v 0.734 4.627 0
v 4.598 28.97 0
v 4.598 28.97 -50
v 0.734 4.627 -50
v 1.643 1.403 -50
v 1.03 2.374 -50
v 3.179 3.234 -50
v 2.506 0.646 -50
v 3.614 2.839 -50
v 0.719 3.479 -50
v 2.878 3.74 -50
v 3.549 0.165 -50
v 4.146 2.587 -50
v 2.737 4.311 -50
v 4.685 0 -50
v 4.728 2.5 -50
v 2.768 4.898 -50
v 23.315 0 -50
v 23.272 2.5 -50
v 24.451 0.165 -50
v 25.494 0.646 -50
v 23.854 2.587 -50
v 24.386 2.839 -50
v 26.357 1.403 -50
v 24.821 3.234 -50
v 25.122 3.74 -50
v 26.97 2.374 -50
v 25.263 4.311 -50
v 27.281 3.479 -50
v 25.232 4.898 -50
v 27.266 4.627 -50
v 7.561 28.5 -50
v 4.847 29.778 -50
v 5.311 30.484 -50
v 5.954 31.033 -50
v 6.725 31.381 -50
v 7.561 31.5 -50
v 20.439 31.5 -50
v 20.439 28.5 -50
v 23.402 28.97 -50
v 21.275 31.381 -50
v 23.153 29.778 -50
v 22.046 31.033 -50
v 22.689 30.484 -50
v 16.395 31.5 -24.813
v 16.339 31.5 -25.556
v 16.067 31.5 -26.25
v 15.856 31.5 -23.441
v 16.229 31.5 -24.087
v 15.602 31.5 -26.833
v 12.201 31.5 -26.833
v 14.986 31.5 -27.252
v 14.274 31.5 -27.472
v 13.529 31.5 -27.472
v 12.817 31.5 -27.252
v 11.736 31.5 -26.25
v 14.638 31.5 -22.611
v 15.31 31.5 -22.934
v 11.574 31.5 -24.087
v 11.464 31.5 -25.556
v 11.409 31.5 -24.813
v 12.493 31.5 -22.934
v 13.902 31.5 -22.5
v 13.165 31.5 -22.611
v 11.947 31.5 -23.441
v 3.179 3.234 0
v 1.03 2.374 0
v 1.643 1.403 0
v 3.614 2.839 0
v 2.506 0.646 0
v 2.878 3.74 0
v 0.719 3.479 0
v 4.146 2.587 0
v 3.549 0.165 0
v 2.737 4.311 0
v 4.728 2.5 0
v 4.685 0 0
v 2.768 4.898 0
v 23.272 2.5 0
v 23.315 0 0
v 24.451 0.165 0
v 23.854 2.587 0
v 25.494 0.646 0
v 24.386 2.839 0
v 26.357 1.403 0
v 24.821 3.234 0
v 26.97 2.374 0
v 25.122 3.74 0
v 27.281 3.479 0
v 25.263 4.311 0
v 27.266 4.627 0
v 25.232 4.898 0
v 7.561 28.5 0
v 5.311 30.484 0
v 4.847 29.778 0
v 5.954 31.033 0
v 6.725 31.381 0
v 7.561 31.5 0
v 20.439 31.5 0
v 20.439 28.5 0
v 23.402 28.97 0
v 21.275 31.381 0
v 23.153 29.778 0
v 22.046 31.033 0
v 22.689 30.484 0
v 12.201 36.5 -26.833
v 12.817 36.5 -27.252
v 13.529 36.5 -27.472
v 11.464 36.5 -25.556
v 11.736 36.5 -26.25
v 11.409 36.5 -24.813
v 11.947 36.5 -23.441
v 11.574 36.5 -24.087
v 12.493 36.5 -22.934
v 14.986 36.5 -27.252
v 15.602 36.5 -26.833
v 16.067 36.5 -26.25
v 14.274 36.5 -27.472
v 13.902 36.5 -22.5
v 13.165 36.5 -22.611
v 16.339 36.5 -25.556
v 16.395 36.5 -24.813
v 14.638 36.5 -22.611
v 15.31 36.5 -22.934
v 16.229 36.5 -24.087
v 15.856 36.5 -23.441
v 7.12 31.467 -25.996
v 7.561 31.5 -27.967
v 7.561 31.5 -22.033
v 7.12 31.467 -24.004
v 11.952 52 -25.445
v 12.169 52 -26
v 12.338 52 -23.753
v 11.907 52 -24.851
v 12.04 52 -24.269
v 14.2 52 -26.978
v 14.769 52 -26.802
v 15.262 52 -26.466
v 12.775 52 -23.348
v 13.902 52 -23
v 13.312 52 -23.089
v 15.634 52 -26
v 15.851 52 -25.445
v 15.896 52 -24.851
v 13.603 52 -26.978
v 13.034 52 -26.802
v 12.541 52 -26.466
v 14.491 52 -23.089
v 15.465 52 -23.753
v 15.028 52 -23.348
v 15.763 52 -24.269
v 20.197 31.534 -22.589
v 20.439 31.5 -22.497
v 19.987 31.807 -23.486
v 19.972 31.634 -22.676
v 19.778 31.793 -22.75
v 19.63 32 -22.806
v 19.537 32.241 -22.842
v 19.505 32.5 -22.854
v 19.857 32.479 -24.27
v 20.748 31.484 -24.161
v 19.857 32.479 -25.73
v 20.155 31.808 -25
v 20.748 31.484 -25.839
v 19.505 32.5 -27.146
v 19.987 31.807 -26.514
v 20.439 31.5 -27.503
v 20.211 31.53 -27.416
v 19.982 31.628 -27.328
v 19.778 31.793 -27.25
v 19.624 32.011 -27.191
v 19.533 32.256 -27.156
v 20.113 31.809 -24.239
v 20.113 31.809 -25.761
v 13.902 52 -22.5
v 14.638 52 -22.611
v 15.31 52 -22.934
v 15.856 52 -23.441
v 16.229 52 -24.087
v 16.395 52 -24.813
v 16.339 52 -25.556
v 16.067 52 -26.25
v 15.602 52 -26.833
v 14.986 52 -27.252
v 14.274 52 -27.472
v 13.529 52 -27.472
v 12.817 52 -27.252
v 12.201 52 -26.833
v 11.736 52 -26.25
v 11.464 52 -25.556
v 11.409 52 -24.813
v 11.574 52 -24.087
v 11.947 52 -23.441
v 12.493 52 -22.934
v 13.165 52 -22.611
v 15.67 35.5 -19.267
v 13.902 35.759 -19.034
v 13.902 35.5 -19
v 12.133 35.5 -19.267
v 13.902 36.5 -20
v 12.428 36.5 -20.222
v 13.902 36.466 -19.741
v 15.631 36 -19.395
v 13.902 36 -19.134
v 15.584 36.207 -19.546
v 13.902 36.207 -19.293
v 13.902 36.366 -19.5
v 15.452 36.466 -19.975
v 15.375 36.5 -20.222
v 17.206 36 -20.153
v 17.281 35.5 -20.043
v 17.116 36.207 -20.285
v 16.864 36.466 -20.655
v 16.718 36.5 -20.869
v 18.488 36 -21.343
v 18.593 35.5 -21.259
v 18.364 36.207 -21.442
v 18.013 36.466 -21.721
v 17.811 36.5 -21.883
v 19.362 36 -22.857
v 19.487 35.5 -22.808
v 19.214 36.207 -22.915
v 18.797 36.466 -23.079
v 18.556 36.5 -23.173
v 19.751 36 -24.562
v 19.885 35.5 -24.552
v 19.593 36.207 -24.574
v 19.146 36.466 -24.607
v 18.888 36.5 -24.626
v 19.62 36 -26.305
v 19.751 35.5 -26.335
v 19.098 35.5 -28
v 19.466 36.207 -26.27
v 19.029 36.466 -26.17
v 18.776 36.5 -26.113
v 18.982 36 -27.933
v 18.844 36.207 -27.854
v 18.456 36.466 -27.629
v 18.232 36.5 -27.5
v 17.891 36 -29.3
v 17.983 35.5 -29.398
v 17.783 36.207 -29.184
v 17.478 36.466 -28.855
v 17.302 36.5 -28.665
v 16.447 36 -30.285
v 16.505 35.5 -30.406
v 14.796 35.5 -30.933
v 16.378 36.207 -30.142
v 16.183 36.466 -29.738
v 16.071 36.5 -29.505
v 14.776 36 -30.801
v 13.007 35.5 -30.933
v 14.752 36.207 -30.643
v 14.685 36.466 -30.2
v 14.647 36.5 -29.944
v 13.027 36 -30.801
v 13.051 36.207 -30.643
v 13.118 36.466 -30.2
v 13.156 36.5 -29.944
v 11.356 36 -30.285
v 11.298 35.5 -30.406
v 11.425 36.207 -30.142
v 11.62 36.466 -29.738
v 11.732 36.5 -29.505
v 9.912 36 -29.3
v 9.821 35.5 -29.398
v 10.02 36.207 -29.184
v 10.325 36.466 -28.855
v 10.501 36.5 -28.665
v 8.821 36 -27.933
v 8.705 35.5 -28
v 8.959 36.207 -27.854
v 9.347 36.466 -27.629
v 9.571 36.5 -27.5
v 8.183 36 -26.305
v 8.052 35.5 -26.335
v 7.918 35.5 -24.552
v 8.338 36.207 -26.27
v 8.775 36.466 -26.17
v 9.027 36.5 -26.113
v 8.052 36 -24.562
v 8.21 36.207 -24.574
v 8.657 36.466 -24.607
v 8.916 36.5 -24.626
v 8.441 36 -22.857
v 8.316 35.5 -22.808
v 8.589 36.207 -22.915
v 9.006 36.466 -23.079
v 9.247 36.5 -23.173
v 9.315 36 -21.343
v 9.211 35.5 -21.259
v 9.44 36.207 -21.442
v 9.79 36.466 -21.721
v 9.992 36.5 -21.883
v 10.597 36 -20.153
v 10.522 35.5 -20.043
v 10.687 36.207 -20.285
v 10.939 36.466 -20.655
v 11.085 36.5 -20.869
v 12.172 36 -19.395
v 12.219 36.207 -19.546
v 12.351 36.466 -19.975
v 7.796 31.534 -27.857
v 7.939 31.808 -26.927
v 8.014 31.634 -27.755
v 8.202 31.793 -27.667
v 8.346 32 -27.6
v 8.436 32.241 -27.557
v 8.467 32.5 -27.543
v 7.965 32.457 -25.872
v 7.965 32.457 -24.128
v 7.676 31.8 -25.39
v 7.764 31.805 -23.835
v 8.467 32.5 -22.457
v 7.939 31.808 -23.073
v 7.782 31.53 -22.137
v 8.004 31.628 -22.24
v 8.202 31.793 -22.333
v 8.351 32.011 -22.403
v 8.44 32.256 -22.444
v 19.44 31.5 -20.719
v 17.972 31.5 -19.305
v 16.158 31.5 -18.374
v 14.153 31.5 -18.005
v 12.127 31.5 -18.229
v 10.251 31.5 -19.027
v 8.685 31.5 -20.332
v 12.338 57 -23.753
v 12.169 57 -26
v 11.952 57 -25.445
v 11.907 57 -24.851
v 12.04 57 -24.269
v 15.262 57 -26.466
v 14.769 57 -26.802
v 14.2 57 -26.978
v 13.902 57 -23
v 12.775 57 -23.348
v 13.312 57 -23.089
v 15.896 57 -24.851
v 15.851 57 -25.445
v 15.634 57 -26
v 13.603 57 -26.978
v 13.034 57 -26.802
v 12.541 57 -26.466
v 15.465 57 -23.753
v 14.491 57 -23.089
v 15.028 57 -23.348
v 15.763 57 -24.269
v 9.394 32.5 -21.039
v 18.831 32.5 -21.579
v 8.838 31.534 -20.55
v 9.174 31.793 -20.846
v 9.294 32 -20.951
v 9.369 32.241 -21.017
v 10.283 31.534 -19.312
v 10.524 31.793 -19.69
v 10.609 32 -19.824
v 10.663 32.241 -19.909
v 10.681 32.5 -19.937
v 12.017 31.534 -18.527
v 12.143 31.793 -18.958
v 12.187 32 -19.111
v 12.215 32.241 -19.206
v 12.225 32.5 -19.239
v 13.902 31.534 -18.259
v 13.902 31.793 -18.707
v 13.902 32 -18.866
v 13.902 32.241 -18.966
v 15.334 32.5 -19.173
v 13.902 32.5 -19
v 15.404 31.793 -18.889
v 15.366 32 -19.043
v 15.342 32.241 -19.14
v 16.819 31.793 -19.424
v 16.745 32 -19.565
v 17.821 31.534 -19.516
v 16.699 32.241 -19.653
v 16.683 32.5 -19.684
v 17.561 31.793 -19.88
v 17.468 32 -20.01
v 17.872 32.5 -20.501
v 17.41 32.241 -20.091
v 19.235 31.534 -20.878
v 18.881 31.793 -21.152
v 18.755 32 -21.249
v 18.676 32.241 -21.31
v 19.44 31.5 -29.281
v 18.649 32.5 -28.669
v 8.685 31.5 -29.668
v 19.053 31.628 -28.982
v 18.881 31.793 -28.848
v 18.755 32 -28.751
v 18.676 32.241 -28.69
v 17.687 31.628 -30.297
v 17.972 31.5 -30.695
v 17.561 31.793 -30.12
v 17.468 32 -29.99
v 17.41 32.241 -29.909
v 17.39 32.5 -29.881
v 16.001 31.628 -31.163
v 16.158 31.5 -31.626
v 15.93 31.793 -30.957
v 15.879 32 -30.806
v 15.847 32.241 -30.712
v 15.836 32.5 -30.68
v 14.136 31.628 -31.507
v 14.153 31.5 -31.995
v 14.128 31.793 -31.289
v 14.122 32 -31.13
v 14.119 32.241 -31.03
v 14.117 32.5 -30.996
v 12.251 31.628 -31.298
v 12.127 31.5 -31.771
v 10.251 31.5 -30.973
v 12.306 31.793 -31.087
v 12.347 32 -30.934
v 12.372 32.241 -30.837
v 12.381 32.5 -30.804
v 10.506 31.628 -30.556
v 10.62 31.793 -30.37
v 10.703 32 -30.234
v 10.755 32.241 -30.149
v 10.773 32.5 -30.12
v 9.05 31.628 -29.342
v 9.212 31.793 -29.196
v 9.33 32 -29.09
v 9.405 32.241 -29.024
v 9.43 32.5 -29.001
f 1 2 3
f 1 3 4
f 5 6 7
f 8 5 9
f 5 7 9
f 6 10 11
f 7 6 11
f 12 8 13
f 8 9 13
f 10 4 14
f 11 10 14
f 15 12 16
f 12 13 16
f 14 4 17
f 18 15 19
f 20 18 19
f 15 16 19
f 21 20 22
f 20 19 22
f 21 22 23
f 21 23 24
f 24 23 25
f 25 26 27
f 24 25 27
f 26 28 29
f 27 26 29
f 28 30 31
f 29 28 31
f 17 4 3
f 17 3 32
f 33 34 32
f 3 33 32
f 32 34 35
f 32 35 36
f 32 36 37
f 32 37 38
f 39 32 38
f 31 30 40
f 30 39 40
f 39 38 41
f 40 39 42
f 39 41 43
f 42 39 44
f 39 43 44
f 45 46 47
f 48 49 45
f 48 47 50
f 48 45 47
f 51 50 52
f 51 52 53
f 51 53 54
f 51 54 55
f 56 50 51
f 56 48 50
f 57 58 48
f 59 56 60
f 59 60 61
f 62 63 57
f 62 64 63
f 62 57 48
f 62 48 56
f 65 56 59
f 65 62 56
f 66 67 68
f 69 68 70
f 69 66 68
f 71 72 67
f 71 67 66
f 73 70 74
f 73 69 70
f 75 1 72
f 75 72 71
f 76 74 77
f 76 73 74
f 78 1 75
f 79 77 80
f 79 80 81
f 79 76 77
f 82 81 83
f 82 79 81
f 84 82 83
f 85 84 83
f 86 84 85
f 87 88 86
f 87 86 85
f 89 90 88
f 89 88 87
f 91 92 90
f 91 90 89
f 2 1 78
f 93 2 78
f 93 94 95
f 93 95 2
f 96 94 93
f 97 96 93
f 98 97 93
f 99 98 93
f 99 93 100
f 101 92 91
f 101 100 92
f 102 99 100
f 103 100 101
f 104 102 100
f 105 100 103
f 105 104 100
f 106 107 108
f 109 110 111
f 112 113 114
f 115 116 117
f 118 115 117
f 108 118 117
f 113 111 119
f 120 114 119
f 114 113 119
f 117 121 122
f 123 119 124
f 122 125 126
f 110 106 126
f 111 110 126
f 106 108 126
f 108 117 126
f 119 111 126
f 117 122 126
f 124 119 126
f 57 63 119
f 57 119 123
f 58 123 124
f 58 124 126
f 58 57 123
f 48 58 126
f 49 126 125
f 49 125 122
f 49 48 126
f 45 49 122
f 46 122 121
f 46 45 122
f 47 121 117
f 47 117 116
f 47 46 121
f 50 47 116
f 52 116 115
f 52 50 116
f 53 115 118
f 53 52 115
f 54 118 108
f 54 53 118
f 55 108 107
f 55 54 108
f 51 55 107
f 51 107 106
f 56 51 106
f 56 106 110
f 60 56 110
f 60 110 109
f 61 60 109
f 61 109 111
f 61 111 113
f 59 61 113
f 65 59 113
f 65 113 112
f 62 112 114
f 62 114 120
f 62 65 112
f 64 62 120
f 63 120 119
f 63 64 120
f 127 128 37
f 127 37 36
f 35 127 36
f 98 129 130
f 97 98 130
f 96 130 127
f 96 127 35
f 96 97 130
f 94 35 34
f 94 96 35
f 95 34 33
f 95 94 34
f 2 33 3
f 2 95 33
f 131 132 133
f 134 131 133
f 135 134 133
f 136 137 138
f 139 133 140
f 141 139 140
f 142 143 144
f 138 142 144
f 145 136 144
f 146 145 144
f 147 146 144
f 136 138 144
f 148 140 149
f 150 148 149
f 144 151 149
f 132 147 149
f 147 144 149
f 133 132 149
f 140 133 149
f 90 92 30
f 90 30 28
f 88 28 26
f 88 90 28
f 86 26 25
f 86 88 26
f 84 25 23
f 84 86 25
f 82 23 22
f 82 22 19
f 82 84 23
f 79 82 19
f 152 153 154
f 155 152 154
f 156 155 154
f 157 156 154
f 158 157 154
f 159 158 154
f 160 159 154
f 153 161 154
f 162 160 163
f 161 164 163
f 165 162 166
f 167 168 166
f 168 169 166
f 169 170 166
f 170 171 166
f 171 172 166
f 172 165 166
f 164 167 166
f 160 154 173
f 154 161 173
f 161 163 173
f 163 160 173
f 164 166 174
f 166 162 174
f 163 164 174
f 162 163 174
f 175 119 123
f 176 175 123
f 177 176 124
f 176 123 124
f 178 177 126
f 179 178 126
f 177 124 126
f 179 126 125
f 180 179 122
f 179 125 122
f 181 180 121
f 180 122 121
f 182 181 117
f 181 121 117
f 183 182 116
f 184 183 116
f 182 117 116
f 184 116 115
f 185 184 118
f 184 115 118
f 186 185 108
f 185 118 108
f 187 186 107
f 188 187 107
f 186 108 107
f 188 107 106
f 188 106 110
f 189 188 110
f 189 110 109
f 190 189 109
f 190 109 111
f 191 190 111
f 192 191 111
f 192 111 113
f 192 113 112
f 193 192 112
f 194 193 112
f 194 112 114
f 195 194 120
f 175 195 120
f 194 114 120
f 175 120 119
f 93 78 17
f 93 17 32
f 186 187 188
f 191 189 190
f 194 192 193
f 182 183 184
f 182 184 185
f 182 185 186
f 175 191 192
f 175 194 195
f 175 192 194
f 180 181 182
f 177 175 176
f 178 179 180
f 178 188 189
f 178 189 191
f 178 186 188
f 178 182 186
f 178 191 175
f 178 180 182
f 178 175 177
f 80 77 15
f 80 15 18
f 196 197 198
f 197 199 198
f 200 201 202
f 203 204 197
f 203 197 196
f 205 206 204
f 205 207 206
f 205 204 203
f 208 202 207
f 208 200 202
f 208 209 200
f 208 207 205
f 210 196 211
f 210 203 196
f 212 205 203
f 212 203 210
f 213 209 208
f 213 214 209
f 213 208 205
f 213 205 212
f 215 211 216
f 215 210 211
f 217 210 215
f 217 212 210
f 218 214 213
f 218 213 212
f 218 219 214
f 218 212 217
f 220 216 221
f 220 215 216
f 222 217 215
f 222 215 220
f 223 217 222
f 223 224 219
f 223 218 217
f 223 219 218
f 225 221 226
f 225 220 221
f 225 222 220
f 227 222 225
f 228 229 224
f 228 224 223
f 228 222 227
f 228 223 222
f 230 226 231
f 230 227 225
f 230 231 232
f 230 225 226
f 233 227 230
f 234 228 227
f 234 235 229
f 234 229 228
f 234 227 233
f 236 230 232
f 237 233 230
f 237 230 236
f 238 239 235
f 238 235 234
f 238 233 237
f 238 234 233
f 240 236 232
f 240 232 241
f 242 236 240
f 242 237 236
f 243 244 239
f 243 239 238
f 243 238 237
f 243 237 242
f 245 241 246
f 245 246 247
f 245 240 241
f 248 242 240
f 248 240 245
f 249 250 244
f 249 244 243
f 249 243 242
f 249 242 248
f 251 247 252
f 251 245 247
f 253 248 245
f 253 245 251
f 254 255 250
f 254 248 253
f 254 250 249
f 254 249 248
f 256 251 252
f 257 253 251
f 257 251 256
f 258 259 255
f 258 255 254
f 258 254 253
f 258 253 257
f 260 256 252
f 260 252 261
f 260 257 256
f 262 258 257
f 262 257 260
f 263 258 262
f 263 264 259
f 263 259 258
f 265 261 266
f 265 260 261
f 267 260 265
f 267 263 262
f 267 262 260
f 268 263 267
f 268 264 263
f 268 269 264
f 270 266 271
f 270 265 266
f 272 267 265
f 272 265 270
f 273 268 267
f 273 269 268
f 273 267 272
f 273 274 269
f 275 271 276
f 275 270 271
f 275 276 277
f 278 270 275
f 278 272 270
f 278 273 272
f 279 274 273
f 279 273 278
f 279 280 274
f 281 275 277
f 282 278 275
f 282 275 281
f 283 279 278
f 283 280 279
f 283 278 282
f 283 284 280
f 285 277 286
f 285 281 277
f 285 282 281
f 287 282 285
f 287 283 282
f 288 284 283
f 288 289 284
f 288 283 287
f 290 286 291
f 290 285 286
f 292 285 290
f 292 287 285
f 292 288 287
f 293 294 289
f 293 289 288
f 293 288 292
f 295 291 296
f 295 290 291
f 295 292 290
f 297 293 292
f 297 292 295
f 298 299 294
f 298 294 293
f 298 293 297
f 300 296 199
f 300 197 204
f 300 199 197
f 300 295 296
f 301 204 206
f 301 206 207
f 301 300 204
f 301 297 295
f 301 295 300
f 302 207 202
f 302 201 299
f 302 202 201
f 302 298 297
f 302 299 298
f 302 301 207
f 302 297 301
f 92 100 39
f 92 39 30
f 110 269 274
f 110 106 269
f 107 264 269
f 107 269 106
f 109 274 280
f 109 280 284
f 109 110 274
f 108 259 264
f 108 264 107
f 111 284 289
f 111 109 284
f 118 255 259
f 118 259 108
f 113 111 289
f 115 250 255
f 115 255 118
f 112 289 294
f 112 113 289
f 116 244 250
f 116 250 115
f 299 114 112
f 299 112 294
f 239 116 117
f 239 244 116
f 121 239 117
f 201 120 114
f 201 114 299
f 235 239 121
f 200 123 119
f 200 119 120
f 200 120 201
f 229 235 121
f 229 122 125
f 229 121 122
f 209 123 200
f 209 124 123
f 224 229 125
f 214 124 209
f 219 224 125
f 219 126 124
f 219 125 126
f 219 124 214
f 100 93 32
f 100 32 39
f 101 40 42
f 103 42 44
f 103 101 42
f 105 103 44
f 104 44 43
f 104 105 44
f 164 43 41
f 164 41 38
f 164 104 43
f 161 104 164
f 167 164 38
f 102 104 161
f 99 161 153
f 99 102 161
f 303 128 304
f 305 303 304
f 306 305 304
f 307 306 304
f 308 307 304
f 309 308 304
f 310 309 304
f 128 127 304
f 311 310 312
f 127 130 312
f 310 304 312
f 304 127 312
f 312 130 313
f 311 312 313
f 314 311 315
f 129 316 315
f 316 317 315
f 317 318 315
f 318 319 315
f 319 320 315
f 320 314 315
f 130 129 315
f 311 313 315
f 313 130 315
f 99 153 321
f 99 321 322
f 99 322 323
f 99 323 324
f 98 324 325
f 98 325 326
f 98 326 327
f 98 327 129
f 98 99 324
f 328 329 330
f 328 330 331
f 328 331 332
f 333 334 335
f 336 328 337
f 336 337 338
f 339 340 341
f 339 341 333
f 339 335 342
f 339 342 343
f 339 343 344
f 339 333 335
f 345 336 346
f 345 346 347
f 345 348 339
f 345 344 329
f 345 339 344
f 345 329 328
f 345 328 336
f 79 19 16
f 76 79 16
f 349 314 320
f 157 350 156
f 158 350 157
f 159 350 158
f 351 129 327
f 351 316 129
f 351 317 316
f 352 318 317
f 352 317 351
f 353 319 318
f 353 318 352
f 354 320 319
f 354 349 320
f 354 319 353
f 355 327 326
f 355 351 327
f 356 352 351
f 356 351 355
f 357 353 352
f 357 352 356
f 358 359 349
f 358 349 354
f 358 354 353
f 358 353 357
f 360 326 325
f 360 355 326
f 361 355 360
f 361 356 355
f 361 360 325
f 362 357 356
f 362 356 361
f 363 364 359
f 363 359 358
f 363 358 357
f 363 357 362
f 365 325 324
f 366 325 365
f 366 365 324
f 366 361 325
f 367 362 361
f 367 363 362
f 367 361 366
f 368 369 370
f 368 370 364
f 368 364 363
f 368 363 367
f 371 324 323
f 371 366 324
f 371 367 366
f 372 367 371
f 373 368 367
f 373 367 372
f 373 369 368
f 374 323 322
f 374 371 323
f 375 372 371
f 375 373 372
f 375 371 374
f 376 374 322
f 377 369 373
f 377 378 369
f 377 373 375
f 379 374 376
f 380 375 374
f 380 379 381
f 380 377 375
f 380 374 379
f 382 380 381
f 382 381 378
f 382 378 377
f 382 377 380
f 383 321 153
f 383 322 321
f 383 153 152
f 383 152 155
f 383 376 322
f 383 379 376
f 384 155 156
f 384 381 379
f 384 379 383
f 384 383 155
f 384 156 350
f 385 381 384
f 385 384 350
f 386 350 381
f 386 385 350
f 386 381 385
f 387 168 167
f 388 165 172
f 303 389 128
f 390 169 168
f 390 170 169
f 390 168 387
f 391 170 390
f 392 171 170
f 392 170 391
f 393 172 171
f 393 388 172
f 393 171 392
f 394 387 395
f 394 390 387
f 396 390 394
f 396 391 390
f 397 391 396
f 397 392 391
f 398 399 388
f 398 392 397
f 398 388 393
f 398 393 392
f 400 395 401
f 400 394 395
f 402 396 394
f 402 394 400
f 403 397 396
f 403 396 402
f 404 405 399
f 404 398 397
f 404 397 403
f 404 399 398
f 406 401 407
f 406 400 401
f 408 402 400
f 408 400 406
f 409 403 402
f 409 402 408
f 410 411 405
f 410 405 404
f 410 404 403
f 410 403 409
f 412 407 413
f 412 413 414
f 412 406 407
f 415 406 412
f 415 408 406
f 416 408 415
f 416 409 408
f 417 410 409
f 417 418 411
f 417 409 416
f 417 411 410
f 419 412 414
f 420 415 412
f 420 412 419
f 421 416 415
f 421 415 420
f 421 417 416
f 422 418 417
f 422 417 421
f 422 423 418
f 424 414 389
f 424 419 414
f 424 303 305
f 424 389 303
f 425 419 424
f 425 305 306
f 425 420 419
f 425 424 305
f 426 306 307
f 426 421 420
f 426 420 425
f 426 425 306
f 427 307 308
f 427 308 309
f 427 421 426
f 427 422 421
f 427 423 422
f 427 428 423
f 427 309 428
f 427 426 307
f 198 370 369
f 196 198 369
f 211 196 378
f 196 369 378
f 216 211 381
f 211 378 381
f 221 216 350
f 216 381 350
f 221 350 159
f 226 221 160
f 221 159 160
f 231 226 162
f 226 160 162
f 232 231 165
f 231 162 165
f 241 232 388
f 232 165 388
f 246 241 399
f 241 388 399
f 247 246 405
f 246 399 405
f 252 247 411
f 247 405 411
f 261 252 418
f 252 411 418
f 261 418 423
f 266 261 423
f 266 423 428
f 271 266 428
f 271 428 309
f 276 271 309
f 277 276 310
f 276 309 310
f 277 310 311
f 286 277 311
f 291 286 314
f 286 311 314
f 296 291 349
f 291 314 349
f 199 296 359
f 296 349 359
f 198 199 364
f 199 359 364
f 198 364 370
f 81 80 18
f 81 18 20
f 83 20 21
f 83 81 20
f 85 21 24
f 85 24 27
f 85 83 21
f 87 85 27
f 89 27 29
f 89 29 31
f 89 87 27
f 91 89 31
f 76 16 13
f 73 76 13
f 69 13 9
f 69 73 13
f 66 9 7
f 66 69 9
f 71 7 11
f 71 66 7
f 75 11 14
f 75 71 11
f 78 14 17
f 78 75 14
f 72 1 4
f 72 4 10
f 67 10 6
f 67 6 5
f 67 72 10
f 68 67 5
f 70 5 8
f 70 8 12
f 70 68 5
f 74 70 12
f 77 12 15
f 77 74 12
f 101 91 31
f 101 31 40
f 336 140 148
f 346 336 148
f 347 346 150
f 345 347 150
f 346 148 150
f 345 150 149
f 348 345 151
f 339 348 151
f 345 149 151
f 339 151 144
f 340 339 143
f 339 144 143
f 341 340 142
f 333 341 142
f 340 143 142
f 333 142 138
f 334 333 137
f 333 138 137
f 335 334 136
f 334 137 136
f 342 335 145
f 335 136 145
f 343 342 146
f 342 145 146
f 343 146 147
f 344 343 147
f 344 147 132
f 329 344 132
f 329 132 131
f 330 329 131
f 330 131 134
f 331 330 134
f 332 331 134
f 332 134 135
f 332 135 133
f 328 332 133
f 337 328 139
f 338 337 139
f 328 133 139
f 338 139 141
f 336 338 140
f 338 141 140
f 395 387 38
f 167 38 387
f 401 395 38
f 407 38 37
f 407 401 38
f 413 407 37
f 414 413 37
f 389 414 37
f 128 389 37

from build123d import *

# Parameters (mm, degrees)
SALIENTE_EXTRUIR1_DEPTH = 50
CROQUIS2_R              = 6
CROQUIS2_R_2            = 2.5
SALIENTE_EXTRUIR2_DEPTH = 5
SALIENTE_EXTRUIR3_START = 5
CROQUIS2_3_R            = 2.5
SALIENTE_EXTRUIR3_DEPTH = 15.5
SALIENTE_EXTRUIR4_START = 20.5
CROQUIS2_4_R            = 2
SALIENTE_EXTRUIR4_DEPTH = 5
REDONDEO1_R             = 1


with BuildPart() as part:
    # Croquis1 → Saliente-Extruir1 (new body)
    with BuildSketch(Plane.XY):
        with BuildLine():
            Line((4.684997697, 0), (23.315002303, 0))
            ThreePointArc((23.315002303, 0), (26.357064161, 1.402720722), (27.265544416, 4.627070177))
            Line((27.265544416, 4.627070177), (23.401539265, 28.970302633))
            ThreePointArc((23.401539265, 28.970302633), (22.386592138, 30.781546394), (20.438632679, 31.5))
            Line((20.438632679, 31.5), (7.561367321, 31.5))
            ThreePointArc((7.561367321, 31.5), (5.613407862, 30.781546394), (4.598460735, 28.970302633))
            Line((4.598460735, 28.970302633), (0.734455584, 4.627070177))
            ThreePointArc((0.734455584, 4.627070177), (1.642935839, 1.402720722), (4.684997697, 0))
        make_face()
        with BuildLine():
            Line((7.561367321, 28.5), (20.438632679, 28.5))
            Line((20.438632679, 28.5), (25.232423855, 4.898092227))
            ThreePointArc((25.232423855, 4.898092227), (24.821021091, 3.234335047), (23.272443606, 2.5))
            Line((23.272443606, 2.5), (4.727556394, 2.5))
            ThreePointArc((4.727556394, 2.5), (3.178978909, 3.234335047), (2.767576145, 4.898092227))
            Line((2.767576145, 4.898092227), (7.561367321, 28.5))
        make_face(mode=Mode.SUBTRACT)
    extrude(amount=-SALIENTE_EXTRUIR1_DEPTH)

    # Croquis2 → Saliente-Extruir2 (add)
    with BuildSketch(Plane(origin=(0, 31.5, 0), x_dir=(1, 0, 0), z_dir=(0, 1, 0))):
        with Locations(Location((13.901539265, 25, 0), (0, 0, 270))):
            Circle(CROQUIS2_R)
        with Locations(Location((13.901539265, 25, 0), (0, 0, 270))):
            Circle(CROQUIS2_R_2, mode=Mode.SUBTRACT)
    extrude(amount=SALIENTE_EXTRUIR2_DEPTH)

    # Redondeo1
    redondeo1_edges = [part.edges().sort_by_distance(p)[0] for p in [
        (13.901539265, 31.5, -31),
        (13.901539265, 36.5, -31),
    ]]
    fillet(redondeo1_edges, radius=REDONDEO1_R)


with BuildPart() as body_2:
    # Croquis2<3> → Saliente-Extruir3 (new body)
    with BuildSketch(Plane(origin=(0, 31.5, 0), x_dir=(1, 0, 0), z_dir=(0, 1, 0)).offset(SALIENTE_EXTRUIR3_START)):
        with Locations(Location((13.901539265, 25, 0), (0, 0, 270))):
            Circle(CROQUIS2_3_R)
    extrude(amount=SALIENTE_EXTRUIR3_DEPTH)


with BuildPart() as body_3:
    # Croquis2<4> → Saliente-Extruir4 (new body)
    with BuildSketch(Plane(origin=(0, 31.5, 0), x_dir=(1, 0, 0), z_dir=(0, 1, 0)).offset(SALIENTE_EXTRUIR4_START)):
        with Locations(Location((13.901539265, 25, 0), (0, 0, 270))):
            Circle(CROQUIS2_4_R)
    extrude(amount=SALIENTE_EXTRUIR4_DEPTH)


solid = Compound([part.part, body_2.part, body_3.part])
